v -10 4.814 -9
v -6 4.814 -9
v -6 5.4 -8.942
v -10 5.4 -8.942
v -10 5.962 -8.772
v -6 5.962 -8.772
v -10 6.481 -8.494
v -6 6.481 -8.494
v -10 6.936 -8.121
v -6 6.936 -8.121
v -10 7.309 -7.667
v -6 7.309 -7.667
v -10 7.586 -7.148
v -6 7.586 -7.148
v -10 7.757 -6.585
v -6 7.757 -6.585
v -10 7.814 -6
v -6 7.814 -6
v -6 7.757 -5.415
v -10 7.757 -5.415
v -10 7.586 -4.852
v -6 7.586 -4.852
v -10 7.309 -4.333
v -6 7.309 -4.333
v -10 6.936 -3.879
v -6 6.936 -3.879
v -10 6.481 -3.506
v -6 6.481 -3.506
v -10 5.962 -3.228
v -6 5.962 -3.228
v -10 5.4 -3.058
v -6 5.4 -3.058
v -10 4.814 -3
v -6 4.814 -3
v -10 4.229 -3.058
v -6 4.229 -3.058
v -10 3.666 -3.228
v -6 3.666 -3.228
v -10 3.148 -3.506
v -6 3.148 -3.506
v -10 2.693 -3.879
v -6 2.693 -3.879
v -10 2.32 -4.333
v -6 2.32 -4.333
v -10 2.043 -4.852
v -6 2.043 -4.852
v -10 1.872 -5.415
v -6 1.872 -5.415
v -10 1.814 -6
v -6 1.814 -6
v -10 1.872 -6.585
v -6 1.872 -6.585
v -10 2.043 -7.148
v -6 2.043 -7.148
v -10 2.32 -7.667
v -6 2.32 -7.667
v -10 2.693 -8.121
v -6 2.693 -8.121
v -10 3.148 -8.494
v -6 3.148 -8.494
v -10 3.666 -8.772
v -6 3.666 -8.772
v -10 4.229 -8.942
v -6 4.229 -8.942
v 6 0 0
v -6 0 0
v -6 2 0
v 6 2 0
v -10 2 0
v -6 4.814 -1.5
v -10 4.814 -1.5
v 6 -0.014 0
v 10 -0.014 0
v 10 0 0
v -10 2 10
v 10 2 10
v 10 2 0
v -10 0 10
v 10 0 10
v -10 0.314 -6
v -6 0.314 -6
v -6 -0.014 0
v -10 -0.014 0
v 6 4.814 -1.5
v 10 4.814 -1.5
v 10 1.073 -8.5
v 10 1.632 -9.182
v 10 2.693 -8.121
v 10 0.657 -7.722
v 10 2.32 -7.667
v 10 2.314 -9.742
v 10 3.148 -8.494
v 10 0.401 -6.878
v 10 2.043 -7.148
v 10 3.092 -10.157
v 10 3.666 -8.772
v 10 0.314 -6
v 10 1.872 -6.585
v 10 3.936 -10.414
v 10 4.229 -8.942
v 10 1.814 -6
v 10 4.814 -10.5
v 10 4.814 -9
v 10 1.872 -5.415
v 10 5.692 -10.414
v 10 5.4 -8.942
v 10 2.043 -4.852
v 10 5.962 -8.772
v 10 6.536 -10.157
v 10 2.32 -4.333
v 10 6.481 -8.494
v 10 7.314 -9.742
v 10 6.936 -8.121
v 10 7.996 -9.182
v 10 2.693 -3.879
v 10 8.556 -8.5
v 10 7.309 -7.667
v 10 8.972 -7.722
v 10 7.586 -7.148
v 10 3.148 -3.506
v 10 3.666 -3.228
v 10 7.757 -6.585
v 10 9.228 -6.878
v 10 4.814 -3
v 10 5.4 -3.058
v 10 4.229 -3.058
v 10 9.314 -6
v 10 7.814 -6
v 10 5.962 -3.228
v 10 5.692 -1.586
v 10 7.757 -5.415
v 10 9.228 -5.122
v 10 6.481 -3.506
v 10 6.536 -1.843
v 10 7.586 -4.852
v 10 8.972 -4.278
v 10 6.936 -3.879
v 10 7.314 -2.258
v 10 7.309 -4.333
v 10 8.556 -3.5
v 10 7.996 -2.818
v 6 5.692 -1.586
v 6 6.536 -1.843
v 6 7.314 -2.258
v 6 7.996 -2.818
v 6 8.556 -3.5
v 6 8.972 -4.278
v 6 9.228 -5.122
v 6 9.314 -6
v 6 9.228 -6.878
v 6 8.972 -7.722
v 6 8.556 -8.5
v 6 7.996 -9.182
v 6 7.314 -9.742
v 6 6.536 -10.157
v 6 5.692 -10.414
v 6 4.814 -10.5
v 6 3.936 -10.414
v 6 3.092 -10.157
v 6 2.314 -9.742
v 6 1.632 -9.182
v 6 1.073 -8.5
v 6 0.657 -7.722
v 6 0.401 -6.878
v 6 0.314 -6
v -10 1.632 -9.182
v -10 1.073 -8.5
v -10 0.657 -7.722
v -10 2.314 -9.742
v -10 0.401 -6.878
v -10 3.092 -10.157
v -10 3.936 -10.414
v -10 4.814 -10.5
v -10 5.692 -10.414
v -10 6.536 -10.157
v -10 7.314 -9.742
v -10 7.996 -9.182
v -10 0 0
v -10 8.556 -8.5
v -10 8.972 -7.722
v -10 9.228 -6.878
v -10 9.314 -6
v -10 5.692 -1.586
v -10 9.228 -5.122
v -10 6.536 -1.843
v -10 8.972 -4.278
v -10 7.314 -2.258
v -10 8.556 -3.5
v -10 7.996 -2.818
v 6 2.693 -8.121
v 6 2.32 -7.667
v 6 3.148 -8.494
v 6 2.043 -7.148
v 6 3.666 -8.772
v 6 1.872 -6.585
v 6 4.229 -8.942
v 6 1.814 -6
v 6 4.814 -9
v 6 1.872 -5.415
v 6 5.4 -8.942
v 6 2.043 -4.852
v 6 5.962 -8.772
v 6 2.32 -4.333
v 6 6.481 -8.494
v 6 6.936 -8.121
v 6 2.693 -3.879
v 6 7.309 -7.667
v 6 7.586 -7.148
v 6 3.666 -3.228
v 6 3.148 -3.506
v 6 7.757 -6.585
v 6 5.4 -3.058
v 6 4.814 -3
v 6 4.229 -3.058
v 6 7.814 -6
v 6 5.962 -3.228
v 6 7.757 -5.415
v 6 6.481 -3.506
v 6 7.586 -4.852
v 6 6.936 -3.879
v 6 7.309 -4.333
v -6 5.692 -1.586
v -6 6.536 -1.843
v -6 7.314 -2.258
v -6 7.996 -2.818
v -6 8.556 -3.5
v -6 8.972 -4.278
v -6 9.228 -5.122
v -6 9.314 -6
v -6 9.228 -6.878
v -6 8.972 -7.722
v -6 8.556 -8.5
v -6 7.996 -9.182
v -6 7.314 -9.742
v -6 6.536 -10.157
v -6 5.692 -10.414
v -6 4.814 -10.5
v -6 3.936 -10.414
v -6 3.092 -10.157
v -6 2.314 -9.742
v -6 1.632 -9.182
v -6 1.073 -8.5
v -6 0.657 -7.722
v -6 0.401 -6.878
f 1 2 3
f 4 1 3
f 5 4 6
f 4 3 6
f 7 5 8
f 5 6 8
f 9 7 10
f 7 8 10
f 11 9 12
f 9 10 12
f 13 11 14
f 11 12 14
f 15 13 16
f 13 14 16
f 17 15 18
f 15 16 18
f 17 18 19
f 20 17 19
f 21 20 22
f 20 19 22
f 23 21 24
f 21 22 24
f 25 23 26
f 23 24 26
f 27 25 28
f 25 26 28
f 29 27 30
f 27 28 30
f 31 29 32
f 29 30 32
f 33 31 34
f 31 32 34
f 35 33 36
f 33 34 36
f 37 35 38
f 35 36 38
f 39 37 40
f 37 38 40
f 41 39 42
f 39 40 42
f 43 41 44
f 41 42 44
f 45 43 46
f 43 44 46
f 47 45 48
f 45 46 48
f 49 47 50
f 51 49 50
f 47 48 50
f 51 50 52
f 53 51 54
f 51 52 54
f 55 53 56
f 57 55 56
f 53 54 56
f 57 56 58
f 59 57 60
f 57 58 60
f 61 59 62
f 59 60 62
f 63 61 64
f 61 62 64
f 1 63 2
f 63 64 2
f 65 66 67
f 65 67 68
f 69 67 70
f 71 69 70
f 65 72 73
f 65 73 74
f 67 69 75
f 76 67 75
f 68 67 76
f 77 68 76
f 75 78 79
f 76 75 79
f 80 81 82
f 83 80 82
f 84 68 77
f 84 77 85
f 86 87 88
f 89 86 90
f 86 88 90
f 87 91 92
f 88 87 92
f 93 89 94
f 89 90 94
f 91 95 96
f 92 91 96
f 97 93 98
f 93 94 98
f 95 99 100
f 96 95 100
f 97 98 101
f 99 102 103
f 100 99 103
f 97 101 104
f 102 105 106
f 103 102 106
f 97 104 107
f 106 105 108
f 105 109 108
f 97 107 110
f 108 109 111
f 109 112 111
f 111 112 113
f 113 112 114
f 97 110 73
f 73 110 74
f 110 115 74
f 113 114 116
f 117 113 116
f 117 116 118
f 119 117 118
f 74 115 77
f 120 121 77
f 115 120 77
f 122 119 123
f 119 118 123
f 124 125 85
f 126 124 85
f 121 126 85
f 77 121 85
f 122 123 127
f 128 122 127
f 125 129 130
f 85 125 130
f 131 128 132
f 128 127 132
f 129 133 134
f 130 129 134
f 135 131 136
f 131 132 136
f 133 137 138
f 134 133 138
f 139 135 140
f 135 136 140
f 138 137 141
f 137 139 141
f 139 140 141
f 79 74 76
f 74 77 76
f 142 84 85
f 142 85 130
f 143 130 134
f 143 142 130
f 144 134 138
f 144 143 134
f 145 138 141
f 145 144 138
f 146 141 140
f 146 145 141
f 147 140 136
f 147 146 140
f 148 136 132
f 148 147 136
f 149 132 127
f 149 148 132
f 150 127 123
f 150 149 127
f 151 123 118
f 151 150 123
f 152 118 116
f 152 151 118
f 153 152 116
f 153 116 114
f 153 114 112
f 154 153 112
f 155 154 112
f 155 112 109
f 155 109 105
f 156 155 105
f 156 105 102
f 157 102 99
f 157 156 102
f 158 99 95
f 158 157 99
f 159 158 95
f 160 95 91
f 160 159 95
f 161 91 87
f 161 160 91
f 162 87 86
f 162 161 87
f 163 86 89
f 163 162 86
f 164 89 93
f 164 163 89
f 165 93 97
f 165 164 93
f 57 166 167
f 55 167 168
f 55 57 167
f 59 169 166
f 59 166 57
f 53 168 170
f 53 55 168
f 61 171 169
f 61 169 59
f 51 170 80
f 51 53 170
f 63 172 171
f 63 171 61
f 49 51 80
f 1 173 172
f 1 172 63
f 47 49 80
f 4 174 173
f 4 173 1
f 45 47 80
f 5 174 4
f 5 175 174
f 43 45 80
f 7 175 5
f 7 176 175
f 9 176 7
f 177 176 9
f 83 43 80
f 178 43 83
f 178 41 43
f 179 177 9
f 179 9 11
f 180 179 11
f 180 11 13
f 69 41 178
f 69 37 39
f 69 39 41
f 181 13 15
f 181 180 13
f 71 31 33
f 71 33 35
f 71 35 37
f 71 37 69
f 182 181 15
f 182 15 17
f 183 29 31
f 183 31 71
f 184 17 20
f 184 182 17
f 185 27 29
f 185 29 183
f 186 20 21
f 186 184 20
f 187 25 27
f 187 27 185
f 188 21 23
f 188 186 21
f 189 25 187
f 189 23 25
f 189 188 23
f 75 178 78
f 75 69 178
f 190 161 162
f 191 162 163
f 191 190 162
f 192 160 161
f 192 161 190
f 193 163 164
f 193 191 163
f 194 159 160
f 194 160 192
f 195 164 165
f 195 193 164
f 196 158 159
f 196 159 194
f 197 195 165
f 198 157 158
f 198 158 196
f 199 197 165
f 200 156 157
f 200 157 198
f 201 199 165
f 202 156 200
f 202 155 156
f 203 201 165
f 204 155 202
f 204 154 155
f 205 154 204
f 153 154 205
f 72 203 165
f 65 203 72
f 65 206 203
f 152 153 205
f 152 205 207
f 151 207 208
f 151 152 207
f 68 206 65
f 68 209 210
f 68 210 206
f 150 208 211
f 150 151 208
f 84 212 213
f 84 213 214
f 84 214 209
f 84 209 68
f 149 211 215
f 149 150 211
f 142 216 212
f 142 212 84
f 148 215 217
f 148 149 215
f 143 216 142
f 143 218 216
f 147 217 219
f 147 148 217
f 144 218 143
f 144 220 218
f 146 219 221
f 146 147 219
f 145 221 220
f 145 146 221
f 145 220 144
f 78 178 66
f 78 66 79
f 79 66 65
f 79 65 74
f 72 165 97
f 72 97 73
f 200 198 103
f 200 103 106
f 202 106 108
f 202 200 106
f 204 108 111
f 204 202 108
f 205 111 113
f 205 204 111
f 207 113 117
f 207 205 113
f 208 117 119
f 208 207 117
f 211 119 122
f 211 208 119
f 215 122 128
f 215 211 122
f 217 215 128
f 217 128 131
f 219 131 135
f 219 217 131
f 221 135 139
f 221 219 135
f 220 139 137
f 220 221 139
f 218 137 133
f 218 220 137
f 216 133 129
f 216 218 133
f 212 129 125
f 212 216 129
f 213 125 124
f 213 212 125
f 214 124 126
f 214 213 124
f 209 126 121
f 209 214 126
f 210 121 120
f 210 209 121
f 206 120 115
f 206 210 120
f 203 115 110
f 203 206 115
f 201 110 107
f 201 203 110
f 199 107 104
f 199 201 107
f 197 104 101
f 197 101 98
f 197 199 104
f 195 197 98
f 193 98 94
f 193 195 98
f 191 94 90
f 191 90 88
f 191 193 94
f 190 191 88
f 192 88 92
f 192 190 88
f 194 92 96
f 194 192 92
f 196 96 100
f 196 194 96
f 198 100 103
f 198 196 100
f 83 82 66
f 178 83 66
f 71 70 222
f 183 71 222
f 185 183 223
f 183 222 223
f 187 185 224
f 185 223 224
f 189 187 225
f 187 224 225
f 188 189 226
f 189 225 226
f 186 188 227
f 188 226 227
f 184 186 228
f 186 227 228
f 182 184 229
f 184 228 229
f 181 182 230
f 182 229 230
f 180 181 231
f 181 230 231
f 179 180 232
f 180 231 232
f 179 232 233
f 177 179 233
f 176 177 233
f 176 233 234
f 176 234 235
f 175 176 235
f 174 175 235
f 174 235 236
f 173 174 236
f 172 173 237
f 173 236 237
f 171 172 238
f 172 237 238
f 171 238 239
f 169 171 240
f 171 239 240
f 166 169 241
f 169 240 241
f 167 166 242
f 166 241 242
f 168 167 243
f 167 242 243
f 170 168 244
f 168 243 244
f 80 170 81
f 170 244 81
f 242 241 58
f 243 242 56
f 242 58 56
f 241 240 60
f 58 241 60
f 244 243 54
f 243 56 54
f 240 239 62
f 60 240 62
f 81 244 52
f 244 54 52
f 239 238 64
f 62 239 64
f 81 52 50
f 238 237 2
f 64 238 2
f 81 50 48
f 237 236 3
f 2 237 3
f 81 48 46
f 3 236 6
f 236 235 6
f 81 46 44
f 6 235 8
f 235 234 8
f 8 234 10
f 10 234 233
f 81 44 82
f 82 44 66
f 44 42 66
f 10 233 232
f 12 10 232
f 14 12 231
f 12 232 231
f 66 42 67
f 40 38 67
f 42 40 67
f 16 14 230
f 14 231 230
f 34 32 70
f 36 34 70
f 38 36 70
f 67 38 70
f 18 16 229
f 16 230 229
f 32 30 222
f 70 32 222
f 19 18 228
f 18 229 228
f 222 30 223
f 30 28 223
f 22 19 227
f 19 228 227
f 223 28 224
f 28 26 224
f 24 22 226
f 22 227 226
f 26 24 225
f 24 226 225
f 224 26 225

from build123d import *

# Parameters (mm, degrees)
SKETCH1_W           = 20
SKETCH1_H           = 10
BOSS_EXTRUDE1_DEPTH = 2
SKETCH4_R           = 3
BOSS_EXTRUDE2_DEPTH = 4


with BuildPart() as part:
    # Sketch1 → Boss-Extrude1 (new body)
    with BuildSketch(Plane(origin=(0, 0, 0), x_dir=(1, 0, 0), z_dir=(0, 1, 0))):
        with Locations((0, -5)):
            Rectangle(SKETCH1_W, SKETCH1_H)
    extrude(amount=BOSS_EXTRUDE1_DEPTH)

    # Sketch4 → Boss-Extrude2 (add)
    with BuildSketch(Plane(origin=(6, 0, 0), x_dir=(0, 0, -1), z_dir=(1, 0, 0))):
        with BuildLine():
            Line((0, 2), (1.5, 4.814384898))
            ThreePointArc((1.5, 4.814384898), (9.181980515, 7.996365414), (6, 0.314384898))
            Line((6, 0.314384898), (0, -0.014042226))
            Line((0, -0.014042226), (0, 2))
        make_face()
        with Locations((6, 4.814384898)):
            Circle(SKETCH4_R, mode=Mode.SUBTRACT)
    boss_extrude2 = extrude(amount=BOSS_EXTRUDE2_DEPTH)

    # Mirror1: Boss-Extrude2 across plane
    add(boss_extrude2.mirror(Plane(origin=(0, 0, 0), x_dir=(0, 0, 1), z_dir=(1, 0, 0))))


solid = part.part
